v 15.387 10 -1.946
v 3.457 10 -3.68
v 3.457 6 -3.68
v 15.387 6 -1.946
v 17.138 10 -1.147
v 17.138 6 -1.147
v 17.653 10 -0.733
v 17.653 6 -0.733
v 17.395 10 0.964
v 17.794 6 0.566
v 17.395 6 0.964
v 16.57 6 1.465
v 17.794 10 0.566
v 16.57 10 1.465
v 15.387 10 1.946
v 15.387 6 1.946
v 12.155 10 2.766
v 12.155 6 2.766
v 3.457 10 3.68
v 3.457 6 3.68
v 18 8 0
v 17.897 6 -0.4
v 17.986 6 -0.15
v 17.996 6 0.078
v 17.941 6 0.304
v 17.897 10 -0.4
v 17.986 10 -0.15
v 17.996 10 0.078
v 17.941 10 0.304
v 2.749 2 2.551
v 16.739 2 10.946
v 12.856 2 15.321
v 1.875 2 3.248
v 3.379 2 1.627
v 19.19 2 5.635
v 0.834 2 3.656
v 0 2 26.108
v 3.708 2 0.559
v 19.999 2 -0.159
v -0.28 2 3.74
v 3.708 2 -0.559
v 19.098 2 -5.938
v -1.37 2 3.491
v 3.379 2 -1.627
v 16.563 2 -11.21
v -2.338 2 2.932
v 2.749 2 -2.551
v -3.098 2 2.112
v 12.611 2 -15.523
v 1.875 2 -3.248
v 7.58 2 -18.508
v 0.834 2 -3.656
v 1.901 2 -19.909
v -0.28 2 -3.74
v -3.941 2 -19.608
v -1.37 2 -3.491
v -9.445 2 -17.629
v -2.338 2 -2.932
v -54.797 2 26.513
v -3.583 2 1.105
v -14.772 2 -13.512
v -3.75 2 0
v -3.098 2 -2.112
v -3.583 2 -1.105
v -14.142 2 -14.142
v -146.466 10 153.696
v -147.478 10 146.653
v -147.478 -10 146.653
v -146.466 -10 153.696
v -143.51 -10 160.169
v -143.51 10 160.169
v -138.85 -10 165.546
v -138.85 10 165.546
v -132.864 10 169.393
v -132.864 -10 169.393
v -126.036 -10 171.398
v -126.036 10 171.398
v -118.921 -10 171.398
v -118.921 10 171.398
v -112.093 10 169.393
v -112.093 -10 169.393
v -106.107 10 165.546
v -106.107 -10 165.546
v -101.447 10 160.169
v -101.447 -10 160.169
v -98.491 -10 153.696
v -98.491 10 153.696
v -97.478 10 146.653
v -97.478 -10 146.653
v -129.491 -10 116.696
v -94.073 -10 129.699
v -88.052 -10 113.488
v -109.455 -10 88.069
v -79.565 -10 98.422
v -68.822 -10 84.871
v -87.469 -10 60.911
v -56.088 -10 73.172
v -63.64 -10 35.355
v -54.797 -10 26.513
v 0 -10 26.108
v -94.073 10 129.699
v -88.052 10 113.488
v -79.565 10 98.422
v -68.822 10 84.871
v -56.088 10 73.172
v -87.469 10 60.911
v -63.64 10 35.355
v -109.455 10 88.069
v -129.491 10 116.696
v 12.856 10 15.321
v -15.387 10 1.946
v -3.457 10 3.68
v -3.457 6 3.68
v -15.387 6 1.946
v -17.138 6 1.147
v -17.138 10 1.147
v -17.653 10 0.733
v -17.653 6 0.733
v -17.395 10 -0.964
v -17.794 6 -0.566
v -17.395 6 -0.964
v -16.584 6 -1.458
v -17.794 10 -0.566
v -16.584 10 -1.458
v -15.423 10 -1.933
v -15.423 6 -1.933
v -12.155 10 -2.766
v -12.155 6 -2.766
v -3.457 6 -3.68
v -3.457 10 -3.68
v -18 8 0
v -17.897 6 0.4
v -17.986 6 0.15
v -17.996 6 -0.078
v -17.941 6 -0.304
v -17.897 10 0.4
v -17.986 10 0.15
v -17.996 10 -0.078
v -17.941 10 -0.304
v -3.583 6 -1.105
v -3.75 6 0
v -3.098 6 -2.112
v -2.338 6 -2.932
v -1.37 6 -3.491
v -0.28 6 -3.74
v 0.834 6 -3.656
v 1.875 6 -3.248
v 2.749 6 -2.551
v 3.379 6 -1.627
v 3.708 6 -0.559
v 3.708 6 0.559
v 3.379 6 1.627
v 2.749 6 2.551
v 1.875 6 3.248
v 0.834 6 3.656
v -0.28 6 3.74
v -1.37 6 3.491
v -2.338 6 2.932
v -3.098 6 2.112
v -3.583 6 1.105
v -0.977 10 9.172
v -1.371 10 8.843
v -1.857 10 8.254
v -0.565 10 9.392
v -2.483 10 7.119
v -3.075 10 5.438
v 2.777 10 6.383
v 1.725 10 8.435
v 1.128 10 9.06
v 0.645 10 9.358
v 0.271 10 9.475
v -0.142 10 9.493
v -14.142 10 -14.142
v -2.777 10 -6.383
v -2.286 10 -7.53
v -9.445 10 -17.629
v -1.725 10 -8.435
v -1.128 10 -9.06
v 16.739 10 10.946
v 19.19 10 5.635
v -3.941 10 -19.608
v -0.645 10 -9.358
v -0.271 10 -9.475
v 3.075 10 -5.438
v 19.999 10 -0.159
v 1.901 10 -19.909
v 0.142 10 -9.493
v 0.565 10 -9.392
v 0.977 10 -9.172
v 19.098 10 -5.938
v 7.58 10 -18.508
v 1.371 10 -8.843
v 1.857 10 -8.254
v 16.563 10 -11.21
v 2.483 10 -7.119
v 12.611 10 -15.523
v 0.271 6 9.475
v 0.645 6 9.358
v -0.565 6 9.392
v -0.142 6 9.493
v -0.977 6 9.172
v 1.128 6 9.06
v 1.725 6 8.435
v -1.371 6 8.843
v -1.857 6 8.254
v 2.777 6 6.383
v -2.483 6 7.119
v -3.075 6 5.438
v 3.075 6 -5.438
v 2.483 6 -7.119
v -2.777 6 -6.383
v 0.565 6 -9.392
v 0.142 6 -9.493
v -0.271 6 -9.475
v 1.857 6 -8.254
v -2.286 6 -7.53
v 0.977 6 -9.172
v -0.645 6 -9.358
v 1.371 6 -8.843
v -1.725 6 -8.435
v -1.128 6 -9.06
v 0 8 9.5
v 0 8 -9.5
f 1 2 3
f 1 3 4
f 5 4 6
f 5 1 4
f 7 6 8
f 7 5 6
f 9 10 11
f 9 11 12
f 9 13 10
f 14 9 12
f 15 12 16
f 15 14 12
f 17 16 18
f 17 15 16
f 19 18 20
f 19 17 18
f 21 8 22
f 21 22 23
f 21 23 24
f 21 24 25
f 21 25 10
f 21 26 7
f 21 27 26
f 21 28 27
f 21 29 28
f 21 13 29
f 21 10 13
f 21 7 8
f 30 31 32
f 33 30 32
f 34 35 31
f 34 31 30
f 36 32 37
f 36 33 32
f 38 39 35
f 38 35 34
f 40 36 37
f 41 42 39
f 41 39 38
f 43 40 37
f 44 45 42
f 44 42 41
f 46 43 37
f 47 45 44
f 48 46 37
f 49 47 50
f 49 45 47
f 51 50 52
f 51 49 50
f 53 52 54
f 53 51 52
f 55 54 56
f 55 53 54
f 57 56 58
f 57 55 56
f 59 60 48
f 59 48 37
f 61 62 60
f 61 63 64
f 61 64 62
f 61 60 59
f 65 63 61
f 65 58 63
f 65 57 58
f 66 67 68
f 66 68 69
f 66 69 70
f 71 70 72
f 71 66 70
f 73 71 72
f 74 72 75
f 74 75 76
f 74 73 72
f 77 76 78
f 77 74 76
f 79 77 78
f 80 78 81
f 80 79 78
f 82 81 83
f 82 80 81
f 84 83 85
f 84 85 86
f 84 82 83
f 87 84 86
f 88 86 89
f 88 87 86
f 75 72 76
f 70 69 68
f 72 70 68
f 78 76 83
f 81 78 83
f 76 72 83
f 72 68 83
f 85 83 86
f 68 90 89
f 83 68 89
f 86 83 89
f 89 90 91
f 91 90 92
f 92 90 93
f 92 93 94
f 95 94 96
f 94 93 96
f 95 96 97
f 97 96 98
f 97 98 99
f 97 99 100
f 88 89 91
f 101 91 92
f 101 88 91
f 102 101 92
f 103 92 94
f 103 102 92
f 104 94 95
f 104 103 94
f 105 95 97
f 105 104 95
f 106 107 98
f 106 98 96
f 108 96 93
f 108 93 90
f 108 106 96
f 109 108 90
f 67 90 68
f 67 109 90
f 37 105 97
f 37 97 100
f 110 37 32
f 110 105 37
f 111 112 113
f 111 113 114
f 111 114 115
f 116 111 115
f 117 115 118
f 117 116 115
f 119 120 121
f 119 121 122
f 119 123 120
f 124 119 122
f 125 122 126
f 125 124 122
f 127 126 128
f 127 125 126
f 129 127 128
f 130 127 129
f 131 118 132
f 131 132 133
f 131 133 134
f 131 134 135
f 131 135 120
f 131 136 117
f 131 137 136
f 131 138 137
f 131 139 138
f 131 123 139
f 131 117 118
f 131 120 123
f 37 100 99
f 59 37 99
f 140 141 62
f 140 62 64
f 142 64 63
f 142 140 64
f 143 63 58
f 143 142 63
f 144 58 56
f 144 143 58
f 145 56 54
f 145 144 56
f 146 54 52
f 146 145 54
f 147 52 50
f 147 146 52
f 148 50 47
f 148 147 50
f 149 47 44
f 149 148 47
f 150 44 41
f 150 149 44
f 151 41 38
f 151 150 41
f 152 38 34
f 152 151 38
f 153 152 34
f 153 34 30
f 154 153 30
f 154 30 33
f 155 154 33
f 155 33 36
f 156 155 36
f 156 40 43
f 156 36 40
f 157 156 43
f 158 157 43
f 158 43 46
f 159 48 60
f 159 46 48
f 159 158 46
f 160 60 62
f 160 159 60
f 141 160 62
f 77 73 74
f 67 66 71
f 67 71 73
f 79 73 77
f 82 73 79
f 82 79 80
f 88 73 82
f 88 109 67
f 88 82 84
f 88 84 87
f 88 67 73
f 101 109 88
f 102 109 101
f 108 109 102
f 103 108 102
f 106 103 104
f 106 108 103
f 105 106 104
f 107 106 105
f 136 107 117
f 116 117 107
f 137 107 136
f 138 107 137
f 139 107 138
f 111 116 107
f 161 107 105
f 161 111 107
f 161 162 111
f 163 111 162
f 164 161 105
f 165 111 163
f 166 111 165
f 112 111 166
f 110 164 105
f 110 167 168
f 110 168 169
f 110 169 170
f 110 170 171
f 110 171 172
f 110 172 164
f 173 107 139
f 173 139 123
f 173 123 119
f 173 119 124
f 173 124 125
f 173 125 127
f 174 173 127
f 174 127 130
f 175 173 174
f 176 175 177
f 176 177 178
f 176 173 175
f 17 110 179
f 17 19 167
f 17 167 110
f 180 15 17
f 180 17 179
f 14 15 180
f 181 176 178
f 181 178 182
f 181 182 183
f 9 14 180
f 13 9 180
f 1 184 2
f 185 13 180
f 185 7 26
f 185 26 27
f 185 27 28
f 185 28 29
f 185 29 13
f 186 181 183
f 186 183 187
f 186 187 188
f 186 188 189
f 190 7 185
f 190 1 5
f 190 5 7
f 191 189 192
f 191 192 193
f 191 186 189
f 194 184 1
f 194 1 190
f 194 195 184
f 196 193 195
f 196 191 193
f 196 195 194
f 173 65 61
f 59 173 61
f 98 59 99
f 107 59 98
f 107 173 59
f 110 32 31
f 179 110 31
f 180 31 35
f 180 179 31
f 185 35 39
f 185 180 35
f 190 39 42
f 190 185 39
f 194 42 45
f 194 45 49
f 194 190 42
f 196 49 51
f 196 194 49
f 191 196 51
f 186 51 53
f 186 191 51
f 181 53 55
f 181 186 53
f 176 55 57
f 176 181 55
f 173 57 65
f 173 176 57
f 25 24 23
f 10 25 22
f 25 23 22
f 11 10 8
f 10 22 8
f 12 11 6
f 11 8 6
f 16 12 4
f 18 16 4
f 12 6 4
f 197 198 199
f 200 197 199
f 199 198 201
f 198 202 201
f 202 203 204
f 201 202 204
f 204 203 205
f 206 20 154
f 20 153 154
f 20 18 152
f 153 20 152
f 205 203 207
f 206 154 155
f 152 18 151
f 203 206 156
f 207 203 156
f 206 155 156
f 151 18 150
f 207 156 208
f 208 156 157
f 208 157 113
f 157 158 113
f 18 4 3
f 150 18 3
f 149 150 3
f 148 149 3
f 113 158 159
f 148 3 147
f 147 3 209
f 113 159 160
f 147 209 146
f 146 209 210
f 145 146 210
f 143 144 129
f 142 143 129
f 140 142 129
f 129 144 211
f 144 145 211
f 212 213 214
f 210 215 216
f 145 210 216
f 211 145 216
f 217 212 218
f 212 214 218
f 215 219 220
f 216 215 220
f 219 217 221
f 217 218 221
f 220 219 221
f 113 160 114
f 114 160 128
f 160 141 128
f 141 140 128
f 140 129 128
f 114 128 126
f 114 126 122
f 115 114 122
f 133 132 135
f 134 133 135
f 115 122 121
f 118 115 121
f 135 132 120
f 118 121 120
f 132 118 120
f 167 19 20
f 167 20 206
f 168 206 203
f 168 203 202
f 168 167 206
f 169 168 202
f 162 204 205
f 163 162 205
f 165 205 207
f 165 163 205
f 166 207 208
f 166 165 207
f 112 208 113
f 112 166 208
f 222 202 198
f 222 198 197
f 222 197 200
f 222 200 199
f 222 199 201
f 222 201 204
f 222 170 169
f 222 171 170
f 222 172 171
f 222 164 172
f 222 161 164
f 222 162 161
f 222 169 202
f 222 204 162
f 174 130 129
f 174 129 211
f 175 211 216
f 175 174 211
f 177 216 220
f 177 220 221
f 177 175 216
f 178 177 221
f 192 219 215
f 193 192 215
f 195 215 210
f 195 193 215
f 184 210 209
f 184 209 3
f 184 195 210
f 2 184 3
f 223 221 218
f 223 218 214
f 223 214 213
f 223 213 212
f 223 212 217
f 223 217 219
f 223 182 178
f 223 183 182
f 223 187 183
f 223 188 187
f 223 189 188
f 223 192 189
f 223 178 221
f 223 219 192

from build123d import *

# Parameters (mm, degrees)
EXTRUDE_1_DEPTH          = 10
SKETCH_2_R               = 3.75
CUT_EXTRUDE_2_DEPTH      = 21
CUT_EXTRUDE_2_DEPTH_BACK = 1
CUT_EXTRUDE_3_DEPTH      = 4
CUT_EXTRUDE_3_DEPTH_BACK = 4
CUT_EXTRUDE_4_DEPTH      = 12


with BuildPart() as part:
    # 草图1 → 凸台-拉伸1 (new body, symmetric)
    with BuildSketch(Plane(origin=(0, 0, 0), x_dir=(1, 0, 0), z_dir=(0, 1, 0))):
        with BuildLine():
            Line((-14.142135624, 14.142135624), (-63.639610307, -35.355339059))
            ThreePointArc((-63.639610307, -35.355339059), (-109.455133557, -88.069120133), (-147.47848225, -146.652648876))
            ThreePointArc((-147.47848225, -146.652648876), (-122.47848225, -171.652648876), (-97.47848225, -146.652648876))
            ThreePointArc((-97.47848225, -146.652648876), (-84.10519624, -105.787977439), (-56.088247687, -73.171773734))
            Line((-56.088247687, -73.171773734), (12.855752194, -15.320888862))
            ThreePointArc((12.855752194, -15.320888862), (14.745546736, 13.511804152), (-14.142135624, 14.142135624))
        make_face()
    extrude(amount=EXTRUDE_1_DEPTH, both=True)

    # 草图2 → 切除-拉伸2 (cut, two sides)
    with BuildSketch(Plane(origin=(0, 10, 0), x_dir=(-1, 0, 0), z_dir=(0, -1, 0))) as cut_extrude_2_sk:
        Circle(SKETCH_2_R)
    extrude(amount=CUT_EXTRUDE_2_DEPTH, mode=Mode.SUBTRACT)
    extrude(cut_extrude_2_sk.sketch, amount=-CUT_EXTRUDE_2_DEPTH_BACK, mode=Mode.SUBTRACT)

    # 草图3 → 切除-拉伸3 (cut, two sides)
    with BuildSketch(Plane(origin=(0, 10, 0), x_dir=(-1, 0, 0), z_dir=(0, -1, 0))) as cut_extrude_3_sk:
        with BuildLine():
            add(Edge.make_bspline(
                [(-3.457188478, 3.680182522), (-18, 3.087230439), (-18, 0), (-18, -3.087230439), (-3.457188478, -3.680182522)],
                knots=[1.764063263, 1.764063263, 1.764063263, 3.141592654, 3.141592654, 4.519122044, 4.519122044, 4.519122044], degree=2, weights=[1, 0.772031744, 1, 0.772031744, 1]))
            add(Edge.make_bspline(
                [(-3.457188478, -3.680182522), (0, -24.523240209), (3.457188478, -3.680182522)],
                knots=[1.968592603, 1.968592603, 1.968592603, 4.314592705, 4.314592705, 4.314592705], degree=2, weights=[1, 0.387387634, 1]))
            add(Edge.make_bspline(
                [(3.457188478, -3.680182522), (18, -3.087230439), (18, 0), (18, 3.087230439), (3.457188478, 3.680182522)],
                knots=[4.905655917, 4.905655917, 4.905655917, 6.283185307, 6.283185307, 7.660714698, 7.660714698, 7.660714698], degree=2, weights=[1, 0.772031744, 1, 0.772031744, 1]))
            add(Edge.make_bspline(
                [(3.457188478, 3.680182522), (0, 24.523240209), (-3.457188478, 3.680182522)],
                knots=[5.110185256, 5.110185256, 5.110185256, 7.456185358, 7.456185358, 7.456185358], degree=2, weights=[1, 0.387387634, 1]))
        make_face()
    extrude(amount=CUT_EXTRUDE_3_DEPTH, mode=Mode.SUBTRACT)
    extrude(cut_extrude_3_sk.sketch, amount=-CUT_EXTRUDE_3_DEPTH_BACK, mode=Mode.SUBTRACT)

    # 草图4 → 切除-拉伸4 (cut)
    with BuildSketch(Plane(origin=(0, -10, 0), x_dir=(-1, 0, 0), z_dir=(0, -1, 0))):
        with BuildLine():
            Line((0, -26.108145787), (54.796803902, -26.512532655))
            Line((54.796803902, -26.512532655), (14.772467095, 13.511804152))
            ThreePointArc((14.772467095, 13.511804152), (-14.441332679, 13.851832142), (-12.855752194, -15.320888862))
            Line((-12.855752194, -15.320888862), (0, -26.108145787))
        make_face()
    extrude(amount=-CUT_EXTRUDE_4_DEPTH, mode=Mode.SUBTRACT)


solid = part.part
